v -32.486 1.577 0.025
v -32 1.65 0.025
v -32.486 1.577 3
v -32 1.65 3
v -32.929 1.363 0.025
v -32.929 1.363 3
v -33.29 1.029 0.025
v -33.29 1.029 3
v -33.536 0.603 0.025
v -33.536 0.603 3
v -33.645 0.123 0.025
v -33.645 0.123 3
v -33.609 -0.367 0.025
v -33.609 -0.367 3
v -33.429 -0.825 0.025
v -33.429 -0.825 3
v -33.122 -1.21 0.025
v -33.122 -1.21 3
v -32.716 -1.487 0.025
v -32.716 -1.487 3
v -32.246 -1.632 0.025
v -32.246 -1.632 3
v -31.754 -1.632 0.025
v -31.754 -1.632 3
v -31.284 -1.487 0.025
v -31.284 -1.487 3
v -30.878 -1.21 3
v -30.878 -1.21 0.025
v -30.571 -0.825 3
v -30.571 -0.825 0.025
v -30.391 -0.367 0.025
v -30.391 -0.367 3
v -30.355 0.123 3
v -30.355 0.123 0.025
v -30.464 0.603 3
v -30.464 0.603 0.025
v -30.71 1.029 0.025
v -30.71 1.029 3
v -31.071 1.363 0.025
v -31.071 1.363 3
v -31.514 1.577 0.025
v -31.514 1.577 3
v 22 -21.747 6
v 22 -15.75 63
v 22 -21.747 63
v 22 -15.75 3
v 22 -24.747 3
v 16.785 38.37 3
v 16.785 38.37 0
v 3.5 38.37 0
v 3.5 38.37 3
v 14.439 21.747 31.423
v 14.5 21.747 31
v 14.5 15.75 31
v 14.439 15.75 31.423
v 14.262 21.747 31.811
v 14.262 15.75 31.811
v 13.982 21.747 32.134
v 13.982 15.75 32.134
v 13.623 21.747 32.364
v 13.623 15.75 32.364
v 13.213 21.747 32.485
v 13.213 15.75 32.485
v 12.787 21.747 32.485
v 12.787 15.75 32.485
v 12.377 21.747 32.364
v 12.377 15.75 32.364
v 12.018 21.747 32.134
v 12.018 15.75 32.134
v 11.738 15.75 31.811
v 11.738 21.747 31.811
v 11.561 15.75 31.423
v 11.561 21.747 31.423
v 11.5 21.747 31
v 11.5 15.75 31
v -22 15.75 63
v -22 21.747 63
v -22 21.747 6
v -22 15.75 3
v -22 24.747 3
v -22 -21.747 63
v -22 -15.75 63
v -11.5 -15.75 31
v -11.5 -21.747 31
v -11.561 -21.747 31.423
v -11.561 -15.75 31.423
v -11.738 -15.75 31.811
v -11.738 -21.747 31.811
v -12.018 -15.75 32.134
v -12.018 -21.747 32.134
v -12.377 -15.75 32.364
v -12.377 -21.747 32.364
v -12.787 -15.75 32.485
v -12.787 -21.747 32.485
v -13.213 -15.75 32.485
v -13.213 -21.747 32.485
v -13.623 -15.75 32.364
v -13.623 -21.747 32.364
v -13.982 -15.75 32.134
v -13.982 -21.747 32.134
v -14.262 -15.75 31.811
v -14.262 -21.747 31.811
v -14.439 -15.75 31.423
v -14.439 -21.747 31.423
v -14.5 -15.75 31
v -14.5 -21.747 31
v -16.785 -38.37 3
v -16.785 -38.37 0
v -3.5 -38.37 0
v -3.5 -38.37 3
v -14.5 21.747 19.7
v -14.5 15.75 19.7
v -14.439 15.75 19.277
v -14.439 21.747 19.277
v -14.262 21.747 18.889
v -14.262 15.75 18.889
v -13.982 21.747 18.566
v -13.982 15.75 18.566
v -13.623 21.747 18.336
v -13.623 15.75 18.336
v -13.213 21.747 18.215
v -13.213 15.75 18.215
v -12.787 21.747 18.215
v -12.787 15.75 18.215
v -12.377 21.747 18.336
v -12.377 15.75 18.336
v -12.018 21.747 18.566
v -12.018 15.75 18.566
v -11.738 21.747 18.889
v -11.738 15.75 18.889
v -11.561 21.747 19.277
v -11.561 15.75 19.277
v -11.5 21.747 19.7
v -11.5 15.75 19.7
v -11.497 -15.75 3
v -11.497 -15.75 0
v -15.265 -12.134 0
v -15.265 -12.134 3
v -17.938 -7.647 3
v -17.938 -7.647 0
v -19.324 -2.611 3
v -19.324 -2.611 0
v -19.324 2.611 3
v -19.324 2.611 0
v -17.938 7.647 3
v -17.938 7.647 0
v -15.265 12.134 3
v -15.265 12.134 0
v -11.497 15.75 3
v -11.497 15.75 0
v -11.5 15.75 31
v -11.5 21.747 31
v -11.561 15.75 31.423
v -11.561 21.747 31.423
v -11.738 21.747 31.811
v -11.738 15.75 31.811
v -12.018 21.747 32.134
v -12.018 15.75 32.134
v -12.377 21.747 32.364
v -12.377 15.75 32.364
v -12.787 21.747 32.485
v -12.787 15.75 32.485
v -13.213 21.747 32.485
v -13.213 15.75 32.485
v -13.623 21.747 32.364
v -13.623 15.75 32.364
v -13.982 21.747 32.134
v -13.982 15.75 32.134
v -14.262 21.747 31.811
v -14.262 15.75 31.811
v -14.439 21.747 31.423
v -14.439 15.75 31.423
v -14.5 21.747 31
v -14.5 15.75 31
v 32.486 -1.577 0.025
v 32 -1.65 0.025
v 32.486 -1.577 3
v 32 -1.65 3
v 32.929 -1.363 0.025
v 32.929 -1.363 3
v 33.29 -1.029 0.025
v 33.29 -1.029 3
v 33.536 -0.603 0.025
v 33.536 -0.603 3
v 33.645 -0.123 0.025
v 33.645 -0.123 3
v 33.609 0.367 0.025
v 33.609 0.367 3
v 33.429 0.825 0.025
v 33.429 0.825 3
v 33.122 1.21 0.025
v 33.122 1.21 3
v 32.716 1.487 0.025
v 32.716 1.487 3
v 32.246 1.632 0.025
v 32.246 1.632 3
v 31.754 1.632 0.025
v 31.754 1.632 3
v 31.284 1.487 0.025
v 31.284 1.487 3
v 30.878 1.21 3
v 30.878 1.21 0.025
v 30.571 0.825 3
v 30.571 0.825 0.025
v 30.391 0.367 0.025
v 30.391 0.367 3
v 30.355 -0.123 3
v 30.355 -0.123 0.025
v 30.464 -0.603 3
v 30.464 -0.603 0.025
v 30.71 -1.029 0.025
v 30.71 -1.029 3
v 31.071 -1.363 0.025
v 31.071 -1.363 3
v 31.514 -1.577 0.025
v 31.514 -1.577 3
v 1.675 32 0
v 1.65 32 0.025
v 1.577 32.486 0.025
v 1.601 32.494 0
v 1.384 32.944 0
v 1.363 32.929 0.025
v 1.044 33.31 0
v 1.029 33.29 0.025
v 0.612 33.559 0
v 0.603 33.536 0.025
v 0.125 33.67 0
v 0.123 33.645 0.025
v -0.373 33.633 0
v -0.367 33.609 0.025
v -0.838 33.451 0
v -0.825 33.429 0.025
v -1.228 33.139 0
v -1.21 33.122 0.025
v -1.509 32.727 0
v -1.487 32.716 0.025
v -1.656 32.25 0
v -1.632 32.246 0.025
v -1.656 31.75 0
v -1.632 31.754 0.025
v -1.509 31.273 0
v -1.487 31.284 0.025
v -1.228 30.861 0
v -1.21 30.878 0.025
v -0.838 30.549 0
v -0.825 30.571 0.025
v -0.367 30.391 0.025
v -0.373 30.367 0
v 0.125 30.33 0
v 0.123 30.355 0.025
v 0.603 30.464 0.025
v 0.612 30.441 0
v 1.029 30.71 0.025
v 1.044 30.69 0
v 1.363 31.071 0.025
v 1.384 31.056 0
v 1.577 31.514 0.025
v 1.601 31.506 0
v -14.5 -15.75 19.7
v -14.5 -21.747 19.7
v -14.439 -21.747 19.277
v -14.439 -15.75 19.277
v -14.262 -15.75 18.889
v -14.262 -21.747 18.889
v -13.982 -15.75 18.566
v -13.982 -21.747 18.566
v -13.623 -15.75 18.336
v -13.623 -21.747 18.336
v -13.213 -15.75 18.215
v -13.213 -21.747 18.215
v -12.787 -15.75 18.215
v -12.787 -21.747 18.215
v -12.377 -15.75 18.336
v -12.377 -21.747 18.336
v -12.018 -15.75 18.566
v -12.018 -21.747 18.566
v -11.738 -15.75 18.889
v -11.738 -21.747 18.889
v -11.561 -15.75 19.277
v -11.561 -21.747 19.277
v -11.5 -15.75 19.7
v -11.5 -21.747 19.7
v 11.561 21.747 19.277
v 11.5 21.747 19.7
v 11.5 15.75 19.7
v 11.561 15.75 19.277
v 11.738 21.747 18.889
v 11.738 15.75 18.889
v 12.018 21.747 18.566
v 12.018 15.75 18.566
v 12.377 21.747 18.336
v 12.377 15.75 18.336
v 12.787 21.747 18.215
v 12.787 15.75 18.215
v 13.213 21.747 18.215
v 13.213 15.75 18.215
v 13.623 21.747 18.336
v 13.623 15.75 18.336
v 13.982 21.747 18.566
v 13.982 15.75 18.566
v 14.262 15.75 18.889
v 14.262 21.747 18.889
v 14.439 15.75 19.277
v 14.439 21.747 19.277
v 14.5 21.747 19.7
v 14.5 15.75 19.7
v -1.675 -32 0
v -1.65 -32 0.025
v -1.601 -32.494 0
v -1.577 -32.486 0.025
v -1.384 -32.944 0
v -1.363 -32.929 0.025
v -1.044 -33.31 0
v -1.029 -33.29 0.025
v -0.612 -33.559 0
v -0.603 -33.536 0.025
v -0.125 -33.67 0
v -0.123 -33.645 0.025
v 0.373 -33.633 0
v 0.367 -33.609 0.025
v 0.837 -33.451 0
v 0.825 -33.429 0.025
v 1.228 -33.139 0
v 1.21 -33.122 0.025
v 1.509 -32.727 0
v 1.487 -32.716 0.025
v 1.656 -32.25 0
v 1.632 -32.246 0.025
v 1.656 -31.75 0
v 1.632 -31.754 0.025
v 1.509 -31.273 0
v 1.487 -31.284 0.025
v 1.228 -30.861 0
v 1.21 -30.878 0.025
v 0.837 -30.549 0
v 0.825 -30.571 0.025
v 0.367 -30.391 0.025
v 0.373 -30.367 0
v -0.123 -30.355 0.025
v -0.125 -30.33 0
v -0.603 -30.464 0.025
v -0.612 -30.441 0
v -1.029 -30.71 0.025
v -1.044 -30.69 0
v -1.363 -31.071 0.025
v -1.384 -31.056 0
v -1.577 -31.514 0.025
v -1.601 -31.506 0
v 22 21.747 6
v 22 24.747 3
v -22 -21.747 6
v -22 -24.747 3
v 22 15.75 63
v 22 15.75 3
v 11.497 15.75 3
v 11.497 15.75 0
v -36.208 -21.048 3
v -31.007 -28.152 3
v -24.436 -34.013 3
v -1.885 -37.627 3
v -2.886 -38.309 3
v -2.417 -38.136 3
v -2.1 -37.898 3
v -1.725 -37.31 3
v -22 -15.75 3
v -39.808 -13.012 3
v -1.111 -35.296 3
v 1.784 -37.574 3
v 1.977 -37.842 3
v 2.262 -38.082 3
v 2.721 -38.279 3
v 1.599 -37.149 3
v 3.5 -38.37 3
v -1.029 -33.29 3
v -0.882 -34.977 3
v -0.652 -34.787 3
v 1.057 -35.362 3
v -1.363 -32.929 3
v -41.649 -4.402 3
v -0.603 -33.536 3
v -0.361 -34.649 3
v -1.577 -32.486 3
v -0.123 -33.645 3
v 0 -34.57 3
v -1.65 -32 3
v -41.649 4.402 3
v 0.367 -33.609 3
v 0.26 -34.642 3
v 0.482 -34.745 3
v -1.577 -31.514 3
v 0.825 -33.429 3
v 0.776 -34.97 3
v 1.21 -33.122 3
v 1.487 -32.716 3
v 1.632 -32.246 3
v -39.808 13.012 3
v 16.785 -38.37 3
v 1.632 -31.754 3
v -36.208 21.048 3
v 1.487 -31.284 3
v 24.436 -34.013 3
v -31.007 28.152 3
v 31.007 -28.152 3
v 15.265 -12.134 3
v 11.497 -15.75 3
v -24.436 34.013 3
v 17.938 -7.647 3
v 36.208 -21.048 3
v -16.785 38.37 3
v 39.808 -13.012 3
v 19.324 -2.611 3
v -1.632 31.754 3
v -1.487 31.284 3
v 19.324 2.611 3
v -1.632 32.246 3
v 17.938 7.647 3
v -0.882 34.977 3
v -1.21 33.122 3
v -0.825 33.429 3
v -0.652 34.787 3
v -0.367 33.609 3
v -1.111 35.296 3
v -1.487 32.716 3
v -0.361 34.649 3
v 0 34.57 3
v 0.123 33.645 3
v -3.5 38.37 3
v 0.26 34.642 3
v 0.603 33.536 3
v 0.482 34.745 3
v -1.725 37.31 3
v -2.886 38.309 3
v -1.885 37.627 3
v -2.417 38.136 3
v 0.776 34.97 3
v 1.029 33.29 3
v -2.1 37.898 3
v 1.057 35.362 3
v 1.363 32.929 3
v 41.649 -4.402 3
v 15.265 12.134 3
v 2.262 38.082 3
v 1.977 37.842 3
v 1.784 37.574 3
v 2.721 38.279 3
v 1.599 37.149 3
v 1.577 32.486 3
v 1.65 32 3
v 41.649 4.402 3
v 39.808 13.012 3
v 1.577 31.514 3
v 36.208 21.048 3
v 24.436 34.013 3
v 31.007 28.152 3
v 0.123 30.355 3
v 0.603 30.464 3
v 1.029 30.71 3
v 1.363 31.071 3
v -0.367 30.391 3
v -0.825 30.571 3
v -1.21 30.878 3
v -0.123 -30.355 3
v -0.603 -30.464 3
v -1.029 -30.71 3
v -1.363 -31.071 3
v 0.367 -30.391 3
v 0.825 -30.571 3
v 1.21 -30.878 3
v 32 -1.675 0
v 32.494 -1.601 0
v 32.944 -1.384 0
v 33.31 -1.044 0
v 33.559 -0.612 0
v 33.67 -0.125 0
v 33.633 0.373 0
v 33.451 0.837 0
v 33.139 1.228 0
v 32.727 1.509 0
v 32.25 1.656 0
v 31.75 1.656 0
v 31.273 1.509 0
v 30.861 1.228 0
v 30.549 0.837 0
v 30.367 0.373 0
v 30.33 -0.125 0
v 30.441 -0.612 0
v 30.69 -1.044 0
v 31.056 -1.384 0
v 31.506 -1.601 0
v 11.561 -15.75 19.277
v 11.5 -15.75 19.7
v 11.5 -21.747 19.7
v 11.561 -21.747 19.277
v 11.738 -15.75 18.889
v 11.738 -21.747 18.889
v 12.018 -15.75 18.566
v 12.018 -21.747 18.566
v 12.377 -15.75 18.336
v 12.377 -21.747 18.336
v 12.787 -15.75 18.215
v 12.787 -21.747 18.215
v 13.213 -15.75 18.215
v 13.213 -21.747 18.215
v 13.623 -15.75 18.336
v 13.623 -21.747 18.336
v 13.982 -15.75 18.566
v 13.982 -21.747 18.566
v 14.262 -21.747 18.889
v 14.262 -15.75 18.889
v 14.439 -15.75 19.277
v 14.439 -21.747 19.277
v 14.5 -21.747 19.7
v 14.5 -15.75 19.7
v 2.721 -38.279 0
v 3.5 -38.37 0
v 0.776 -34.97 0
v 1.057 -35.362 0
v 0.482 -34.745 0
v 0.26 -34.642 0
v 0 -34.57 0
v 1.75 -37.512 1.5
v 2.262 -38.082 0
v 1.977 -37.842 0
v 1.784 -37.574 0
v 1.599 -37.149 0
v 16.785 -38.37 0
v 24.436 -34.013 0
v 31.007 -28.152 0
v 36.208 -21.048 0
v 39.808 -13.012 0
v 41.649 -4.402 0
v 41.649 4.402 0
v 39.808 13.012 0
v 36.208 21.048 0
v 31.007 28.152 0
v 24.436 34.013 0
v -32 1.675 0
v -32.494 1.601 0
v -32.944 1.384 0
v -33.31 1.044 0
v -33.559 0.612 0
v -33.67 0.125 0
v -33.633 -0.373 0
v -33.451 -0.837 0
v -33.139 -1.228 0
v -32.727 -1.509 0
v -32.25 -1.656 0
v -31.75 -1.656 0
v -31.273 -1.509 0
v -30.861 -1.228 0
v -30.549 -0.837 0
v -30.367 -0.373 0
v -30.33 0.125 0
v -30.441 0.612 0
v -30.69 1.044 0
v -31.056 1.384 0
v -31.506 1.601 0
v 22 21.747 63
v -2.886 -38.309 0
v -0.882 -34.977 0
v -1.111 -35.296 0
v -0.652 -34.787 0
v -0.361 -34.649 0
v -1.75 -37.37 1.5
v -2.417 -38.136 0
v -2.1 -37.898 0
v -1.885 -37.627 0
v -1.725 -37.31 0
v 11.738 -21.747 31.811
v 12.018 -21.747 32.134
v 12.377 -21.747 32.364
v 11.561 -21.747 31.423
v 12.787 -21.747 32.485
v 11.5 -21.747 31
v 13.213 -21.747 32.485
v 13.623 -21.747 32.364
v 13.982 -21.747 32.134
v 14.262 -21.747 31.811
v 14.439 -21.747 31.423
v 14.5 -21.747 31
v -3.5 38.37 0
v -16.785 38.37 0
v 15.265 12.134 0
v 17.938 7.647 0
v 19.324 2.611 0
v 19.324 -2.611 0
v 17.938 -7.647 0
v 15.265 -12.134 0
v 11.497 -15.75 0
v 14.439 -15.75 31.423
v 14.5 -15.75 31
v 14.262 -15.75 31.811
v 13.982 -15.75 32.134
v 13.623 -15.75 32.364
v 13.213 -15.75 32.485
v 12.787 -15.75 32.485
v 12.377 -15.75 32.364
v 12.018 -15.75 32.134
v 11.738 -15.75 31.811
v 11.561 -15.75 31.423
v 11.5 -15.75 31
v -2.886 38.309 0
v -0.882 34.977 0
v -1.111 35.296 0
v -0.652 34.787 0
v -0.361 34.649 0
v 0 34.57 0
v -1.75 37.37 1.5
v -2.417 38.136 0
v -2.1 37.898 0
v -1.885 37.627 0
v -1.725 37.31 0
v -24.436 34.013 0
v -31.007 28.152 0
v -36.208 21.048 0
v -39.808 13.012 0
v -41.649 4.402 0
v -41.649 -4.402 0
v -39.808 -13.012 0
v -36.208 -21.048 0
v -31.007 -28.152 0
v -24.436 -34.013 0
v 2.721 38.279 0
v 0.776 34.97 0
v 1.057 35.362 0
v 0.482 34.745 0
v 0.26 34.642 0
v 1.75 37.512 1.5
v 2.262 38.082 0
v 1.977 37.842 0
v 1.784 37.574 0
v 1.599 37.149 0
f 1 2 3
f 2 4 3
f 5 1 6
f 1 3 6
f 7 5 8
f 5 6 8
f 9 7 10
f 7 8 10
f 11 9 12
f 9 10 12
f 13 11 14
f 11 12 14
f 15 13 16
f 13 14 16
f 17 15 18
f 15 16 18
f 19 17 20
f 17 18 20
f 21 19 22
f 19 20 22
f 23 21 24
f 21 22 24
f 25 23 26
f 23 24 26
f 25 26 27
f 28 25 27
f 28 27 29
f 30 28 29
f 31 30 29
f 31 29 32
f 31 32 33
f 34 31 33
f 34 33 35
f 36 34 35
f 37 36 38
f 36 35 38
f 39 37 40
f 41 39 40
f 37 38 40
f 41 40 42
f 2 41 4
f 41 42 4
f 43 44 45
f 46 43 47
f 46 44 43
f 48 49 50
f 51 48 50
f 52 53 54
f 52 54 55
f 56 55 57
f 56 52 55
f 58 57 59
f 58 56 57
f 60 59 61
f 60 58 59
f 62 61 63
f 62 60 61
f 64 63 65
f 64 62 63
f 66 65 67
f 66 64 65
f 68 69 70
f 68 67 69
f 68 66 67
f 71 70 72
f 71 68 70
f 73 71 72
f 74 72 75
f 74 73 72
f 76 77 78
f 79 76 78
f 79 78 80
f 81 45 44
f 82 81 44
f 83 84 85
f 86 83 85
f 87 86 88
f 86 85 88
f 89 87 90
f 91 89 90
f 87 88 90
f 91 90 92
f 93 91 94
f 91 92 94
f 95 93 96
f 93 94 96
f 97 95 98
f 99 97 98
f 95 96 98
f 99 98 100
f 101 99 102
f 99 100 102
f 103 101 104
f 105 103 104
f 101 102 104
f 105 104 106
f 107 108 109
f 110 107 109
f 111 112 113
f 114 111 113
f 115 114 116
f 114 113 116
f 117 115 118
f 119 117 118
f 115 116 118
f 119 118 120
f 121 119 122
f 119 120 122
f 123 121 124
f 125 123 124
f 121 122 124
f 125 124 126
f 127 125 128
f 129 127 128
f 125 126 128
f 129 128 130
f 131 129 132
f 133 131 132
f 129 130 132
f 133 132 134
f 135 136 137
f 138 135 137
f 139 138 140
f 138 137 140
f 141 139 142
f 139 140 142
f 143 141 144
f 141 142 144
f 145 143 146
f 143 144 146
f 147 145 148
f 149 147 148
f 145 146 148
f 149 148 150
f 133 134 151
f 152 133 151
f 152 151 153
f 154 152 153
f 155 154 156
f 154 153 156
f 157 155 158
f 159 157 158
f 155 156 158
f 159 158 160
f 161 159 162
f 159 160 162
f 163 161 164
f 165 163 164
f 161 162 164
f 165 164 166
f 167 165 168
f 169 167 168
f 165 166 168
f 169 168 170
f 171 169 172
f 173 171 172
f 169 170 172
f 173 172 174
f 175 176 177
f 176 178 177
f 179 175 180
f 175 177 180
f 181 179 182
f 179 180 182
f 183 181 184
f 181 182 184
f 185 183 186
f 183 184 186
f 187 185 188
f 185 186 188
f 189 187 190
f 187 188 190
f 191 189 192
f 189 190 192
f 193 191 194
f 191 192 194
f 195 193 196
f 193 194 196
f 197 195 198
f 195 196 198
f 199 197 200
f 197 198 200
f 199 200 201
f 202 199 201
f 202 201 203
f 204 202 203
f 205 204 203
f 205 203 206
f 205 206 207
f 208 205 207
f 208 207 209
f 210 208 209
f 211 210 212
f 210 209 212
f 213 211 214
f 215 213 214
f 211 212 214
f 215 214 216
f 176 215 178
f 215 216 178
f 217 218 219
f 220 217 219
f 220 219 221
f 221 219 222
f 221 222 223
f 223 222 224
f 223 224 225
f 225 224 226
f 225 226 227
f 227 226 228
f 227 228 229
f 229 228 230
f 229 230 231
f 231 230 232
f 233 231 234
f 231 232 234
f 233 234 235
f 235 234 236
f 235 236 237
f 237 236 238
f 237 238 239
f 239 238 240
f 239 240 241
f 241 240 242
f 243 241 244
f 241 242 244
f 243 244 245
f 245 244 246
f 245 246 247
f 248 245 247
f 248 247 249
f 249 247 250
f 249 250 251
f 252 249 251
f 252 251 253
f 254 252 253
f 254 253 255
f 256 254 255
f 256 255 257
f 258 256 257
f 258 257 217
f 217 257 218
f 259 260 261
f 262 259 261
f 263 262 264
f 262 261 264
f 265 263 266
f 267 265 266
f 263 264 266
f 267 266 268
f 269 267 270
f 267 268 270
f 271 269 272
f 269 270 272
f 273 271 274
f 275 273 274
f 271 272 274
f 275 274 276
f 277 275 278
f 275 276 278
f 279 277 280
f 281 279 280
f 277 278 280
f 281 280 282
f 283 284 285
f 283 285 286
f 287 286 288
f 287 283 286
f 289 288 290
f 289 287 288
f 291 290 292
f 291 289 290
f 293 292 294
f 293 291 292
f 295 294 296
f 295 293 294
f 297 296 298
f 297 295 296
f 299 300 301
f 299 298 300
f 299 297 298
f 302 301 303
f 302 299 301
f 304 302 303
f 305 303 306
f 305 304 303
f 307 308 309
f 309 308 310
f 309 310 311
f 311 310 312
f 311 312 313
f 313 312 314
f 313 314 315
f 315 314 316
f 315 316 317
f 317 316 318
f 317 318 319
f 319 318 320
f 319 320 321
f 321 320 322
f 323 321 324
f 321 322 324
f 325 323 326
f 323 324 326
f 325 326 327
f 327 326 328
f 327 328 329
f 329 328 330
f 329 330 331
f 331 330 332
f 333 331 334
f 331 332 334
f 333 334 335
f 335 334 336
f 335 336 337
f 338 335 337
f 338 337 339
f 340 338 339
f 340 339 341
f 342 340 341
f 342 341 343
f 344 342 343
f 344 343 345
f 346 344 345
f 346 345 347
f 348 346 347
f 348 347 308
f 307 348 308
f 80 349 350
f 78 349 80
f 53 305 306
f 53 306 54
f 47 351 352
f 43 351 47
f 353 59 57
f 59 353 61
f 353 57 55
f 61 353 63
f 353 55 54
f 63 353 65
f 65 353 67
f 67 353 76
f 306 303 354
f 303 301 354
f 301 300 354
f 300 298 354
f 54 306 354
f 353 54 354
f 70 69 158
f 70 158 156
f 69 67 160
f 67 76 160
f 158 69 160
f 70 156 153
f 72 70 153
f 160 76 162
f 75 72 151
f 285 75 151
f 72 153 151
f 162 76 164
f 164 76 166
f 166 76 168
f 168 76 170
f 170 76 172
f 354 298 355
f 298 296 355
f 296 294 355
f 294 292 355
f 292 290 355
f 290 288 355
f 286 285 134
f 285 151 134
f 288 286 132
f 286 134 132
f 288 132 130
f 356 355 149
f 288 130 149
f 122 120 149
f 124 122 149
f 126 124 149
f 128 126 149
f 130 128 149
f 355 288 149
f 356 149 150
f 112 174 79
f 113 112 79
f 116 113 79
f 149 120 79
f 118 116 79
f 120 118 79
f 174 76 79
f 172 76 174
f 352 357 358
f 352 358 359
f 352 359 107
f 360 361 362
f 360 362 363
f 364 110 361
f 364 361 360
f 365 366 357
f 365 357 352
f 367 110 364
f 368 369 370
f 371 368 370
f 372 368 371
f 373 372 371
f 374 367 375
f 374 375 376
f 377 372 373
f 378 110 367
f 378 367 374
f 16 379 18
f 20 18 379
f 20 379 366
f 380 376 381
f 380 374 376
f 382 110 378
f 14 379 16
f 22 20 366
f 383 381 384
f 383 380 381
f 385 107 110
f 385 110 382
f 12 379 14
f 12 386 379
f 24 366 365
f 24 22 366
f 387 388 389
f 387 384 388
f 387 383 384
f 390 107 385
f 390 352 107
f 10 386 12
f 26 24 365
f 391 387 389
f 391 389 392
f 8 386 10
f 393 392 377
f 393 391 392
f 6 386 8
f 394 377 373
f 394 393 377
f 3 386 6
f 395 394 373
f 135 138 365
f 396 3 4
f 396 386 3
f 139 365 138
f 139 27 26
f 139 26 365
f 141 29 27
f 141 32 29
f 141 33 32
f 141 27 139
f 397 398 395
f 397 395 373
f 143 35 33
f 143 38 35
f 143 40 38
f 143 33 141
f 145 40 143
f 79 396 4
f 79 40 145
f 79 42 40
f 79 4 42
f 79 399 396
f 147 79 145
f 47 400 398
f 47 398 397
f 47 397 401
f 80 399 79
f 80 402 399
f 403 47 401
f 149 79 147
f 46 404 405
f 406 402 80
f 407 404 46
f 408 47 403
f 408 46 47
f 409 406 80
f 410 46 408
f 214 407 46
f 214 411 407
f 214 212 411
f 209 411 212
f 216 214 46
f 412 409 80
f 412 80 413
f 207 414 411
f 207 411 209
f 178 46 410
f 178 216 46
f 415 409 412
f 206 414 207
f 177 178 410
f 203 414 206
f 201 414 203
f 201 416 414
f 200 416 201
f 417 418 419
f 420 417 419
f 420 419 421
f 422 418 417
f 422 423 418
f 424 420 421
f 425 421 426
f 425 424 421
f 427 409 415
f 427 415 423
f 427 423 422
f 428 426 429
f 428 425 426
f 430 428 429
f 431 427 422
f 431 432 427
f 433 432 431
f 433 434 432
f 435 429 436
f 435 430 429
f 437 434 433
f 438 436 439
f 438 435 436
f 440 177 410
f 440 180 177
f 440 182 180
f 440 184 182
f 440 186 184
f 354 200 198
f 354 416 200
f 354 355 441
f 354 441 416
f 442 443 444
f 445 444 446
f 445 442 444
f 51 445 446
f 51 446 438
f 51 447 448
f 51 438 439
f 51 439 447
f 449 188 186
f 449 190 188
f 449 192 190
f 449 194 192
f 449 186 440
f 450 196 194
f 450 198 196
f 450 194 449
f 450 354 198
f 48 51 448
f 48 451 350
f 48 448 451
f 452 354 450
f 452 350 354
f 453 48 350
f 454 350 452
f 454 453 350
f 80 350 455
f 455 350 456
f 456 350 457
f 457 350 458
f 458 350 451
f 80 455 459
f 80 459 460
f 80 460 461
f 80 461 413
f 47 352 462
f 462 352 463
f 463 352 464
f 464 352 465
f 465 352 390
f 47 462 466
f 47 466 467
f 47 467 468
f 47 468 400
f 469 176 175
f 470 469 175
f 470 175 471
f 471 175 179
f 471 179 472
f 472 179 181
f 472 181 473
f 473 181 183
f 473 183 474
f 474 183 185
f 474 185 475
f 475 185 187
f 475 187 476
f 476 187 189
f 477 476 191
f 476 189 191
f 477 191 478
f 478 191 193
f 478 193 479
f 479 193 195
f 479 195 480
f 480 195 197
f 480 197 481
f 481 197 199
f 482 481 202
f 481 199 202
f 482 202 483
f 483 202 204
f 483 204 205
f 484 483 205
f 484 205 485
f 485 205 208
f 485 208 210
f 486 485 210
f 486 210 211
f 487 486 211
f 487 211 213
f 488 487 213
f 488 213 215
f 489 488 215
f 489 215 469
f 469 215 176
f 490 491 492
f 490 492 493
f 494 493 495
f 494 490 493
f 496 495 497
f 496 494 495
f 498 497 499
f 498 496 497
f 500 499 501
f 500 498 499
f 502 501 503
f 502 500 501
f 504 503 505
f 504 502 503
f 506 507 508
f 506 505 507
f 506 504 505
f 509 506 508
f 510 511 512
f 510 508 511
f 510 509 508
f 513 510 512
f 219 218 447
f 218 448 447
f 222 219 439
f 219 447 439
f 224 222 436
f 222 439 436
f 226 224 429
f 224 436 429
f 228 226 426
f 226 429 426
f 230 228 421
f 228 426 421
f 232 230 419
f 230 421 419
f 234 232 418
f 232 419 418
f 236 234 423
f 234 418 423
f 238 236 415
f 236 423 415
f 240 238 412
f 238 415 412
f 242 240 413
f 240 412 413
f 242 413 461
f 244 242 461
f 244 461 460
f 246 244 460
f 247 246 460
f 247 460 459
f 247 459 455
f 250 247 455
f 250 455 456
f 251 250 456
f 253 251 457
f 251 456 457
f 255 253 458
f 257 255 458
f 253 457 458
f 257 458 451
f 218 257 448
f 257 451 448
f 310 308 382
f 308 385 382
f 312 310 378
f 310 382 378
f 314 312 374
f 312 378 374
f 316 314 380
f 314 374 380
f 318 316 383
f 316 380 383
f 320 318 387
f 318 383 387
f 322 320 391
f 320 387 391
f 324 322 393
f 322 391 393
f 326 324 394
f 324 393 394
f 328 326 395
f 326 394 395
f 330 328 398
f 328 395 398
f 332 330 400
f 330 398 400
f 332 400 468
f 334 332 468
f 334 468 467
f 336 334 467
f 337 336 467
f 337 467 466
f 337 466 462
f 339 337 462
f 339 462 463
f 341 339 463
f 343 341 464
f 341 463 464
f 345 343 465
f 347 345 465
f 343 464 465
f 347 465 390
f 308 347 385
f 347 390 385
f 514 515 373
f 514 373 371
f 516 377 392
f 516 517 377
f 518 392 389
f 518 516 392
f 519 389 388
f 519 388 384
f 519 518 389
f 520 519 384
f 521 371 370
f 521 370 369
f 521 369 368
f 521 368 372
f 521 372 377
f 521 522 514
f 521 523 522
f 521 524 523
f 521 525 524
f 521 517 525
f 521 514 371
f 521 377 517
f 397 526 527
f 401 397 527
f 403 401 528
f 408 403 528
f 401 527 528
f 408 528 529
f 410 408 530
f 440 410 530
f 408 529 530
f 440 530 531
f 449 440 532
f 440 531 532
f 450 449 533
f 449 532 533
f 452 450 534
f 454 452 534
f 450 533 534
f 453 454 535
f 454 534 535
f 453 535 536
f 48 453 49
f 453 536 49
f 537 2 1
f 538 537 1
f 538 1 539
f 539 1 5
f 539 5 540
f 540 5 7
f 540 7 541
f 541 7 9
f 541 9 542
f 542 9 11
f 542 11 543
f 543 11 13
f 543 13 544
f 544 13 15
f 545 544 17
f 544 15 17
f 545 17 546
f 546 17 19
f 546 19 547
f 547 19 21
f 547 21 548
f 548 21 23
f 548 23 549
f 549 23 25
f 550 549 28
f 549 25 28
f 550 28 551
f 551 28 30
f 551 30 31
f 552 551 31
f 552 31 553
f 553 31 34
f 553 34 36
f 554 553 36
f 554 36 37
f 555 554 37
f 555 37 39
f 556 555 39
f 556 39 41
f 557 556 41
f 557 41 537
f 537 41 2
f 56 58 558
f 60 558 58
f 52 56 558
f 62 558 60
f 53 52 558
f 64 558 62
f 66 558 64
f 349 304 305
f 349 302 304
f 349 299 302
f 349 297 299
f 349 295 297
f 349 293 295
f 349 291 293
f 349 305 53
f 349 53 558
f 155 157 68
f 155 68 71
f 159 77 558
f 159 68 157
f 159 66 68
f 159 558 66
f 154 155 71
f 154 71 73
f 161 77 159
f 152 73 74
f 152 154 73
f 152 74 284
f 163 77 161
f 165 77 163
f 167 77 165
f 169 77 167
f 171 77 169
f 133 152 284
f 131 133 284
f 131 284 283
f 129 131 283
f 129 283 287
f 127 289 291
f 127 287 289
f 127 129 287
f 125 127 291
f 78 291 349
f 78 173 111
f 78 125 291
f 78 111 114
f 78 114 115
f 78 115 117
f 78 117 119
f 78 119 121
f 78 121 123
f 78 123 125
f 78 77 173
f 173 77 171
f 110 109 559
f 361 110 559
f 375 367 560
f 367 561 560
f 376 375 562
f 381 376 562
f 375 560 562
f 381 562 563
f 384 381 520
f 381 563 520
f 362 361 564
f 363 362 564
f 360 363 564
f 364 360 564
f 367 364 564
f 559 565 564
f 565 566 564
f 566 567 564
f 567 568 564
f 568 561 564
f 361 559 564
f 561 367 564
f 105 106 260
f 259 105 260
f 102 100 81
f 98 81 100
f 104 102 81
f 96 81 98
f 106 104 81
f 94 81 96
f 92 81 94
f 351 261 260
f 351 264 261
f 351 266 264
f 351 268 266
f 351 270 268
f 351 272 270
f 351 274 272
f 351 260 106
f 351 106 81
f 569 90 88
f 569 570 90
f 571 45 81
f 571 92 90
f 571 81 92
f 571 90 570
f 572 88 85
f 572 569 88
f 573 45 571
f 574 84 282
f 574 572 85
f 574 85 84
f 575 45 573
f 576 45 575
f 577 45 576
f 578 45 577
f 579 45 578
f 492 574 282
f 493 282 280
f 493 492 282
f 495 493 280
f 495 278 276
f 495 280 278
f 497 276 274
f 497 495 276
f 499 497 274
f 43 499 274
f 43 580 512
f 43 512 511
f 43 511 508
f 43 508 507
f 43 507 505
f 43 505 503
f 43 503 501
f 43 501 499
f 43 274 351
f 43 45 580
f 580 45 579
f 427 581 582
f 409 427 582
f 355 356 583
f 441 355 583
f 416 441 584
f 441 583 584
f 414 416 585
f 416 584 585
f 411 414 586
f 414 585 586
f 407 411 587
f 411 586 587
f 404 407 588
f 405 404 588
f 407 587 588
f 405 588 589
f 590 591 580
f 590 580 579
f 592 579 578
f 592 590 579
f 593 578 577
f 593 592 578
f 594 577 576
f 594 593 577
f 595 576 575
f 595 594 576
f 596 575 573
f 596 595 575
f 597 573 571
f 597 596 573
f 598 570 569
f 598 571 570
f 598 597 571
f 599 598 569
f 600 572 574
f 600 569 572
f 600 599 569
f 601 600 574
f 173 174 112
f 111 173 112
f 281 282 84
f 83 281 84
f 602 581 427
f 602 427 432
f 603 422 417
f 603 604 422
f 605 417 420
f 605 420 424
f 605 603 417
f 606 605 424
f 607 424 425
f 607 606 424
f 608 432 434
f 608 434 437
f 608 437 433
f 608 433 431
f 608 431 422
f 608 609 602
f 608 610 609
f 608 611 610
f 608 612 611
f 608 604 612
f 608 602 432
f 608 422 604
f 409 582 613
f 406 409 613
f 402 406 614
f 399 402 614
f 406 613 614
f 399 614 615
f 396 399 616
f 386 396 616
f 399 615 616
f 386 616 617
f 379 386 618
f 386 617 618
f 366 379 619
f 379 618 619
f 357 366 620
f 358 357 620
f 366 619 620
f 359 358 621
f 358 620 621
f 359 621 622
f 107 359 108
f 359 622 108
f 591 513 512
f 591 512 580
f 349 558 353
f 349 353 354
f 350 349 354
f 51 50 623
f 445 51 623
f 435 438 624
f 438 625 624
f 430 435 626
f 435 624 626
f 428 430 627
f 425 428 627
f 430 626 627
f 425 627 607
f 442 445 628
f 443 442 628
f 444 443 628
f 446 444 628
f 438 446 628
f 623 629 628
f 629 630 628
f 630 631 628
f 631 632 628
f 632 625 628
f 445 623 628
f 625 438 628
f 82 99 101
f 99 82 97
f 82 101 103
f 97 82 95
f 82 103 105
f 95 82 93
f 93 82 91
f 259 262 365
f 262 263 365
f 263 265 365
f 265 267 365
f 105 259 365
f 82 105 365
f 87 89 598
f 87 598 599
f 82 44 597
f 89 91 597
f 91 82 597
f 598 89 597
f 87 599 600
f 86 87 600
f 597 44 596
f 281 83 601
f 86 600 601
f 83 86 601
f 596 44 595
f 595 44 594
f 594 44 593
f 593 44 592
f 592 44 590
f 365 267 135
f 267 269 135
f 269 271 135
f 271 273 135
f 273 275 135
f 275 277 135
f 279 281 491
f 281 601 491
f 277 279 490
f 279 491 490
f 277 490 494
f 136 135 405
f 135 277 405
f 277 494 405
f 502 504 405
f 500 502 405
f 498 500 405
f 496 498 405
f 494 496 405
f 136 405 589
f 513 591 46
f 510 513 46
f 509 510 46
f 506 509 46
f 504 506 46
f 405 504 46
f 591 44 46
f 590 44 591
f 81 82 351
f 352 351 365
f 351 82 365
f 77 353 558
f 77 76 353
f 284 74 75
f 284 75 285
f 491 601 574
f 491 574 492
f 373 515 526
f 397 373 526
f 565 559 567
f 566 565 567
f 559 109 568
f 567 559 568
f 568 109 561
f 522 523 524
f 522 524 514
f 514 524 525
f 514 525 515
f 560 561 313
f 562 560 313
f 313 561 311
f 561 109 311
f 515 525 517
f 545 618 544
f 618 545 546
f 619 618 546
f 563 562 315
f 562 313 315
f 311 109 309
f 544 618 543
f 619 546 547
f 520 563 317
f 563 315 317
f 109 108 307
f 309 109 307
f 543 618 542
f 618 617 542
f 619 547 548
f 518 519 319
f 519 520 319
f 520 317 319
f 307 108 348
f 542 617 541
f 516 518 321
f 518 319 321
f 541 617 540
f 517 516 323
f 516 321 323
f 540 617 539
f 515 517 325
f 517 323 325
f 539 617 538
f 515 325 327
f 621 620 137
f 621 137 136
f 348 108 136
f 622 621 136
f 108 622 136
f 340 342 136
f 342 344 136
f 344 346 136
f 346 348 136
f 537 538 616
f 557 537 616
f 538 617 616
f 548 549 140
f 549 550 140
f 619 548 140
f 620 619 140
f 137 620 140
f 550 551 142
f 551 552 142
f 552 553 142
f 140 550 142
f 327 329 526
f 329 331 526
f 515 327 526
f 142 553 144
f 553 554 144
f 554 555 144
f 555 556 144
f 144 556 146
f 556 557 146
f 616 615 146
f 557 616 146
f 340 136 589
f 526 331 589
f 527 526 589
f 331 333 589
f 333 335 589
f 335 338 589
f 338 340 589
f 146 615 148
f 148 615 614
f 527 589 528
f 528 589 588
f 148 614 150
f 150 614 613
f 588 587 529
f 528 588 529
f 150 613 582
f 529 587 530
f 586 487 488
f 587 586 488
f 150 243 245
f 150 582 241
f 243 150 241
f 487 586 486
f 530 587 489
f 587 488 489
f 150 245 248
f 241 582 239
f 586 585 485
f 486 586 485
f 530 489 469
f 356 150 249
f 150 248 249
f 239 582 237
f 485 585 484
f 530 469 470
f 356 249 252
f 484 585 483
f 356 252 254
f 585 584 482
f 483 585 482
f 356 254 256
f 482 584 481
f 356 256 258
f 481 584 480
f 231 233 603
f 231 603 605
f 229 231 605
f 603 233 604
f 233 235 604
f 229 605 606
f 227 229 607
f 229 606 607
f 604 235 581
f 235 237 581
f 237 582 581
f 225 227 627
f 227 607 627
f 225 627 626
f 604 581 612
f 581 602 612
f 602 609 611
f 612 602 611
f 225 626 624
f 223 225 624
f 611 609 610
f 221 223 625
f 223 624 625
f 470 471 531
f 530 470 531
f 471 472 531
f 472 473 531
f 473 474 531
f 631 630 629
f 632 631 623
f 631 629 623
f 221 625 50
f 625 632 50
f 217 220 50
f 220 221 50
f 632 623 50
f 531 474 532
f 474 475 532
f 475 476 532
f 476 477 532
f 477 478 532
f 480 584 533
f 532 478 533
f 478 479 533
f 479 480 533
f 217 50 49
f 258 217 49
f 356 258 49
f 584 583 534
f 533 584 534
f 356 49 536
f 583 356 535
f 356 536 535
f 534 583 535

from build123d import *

# Parameters (mm, degrees)
BOSS_EXTRUDE1_DEPTH                   = 3
TAP_DRILL_FOR_M4X0_7_TAP1_D           = 3.3
TAP_DRILL_FOR_M4X0_7_TAP1_CSINK_D     = 3.35
TAP_DRILL_FOR_M4X0_7_TAP1_CSINK_ANGLE = 90
CIRPATTERN1_COUNT                     = 4
SKETCH11_W                            = 60
SKETCH11_H                            = 5.997041234
BOSS_EXTRUDE2_DEPTH                   = 22
CUT_EXTRUDE4_DEPTH                    = 35
CHAMFER1_SIZE                         = 3
CHAMFER2_SIZE                         = 3


with BuildPart() as part:
    # Sketch1 → Boss-Extrude1 (new body)
    with BuildSketch(Plane.XY):
        with BuildLine():
            Line((-16.785410333, -38.37), (-3.5, -38.37))
            add(Edge.make_bspline(
                [(-3.5, -38.37), (-2.487663845, -38.37), (-1.180873463, -37.25254604), (-1.493022396, -34.741636396), (0, -34.57)],
                knots=[0, 0, 0, 0, 0.364574194, 1, 1, 1, 1], degree=3))
            add(Edge.make_bspline(
                [(3.5, -38.37), (2.522461063, -38.37), (1.117320535, -37.441425493), (1.462124558, -34.862224896), (0, -34.57)],
                knots=[0, 0, 0, 0, 0.352042618, 1, 1, 1, 1], degree=3))
            Line((3.5, -38.37), (16.785410333, -38.37))
            ThreePointArc((16.785410333, -38.37), (41.88086556, 0), (16.785410333, 38.37))
            Line((16.785410333, 38.37), (3.5, 38.37))
            add(Edge.make_bspline(
                [(3.5, 38.37), (2.522461063, 38.37), (1.117320535, 37.441425493), (1.462124558, 34.862224896), (0, 34.57)],
                knots=[0, 0, 0, 0, 0.352042618, 1, 1, 1, 1], degree=3))
            add(Edge.make_bspline(
                [(-3.5, 38.37), (-2.487663845, 38.37), (-1.180873463, 37.25254604), (-1.493022396, 34.741636396), (0, 34.57)],
                knots=[0, 0, 0, 0, 0.364574194, 1, 1, 1, 1], degree=3))
            Line((-3.5, 38.37), (-16.785410333, 38.37))
            ThreePointArc((-16.785410333, 38.37), (-41.88086556, 0), (-16.785410333, -38.37))
        make_face()
        with BuildLine():
            Line((11.497282288, -15.75), (-11.497282288, -15.75))
            ThreePointArc((-11.497282288, -15.75), (-19.5, 0), (-11.497282288, 15.75))
            Line((-11.497282288, 15.75), (11.497282288, 15.75))
            ThreePointArc((11.497282288, 15.75), (19.5, 0), (11.497282288, -15.75))
        make_face(mode=Mode.SUBTRACT)
    extrude(amount=BOSS_EXTRUDE1_DEPTH)

    # Tap Drill for M4x0.7 Tap1 (through all)
    with Locations(Plane(origin=(0, 32, 0), x_dir=(-1, 0, 0), z_dir=(0, 0, -1))):
        with Locations((0, 0)):
            tap_drill_for_m4x0_7_tap1 = CounterSinkHole(TAP_DRILL_FOR_M4X0_7_TAP1_D / 2, TAP_DRILL_FOR_M4X0_7_TAP1_CSINK_D / 2, counter_sink_angle=TAP_DRILL_FOR_M4X0_7_TAP1_CSINK_ANGLE)

    # CirPattern1: Tap Drill for M4x0.7 Tap1 ×4 about axis
    cirpattern1_axis = Axis((0, 0, 0), (0, 0, 1))
    for i in range(1, CIRPATTERN1_COUNT):
        add(tap_drill_for_m4x0_7_tap1.rotate(cirpattern1_axis, i * 360 / CIRPATTERN1_COUNT), mode=Mode.SUBTRACT)

    # Sketch11 → Boss-Extrude2 (add, symmetric)
    with BuildSketch(Plane(origin=(0, 0, 0), x_dir=(0, 0, -1), z_dir=(1, 0, 0))):
        with Locations((-33, 18.748520617)):
            Rectangle(SKETCH11_W, SKETCH11_H)
        with Locations((-33, -18.748520617)):
            Rectangle(SKETCH11_W, SKETCH11_H)
    extrude(amount=BOSS_EXTRUDE2_DEPTH, both=True)

    # Sketch9 → Cut-Extrude4 (cut, symmetric)
    with BuildSketch(Plane(origin=(28, 0, 0), x_dir=(0, 0, -1), z_dir=(0, -1, 0))):
        with BuildLine():
            Line((-19.7, -13.5), (-31, -13.5))
            ThreePointArc((-31, -13.5), (-32.5, -15), (-31, -16.5))
            Line((-31, -16.5), (-19.7, -16.5))
            ThreePointArc((-19.7, -16.5), (-18.2, -15), (-19.7, -13.5))
        make_face()
        with BuildLine():
            Line((-19.7, -39.5), (-31, -39.5))
            ThreePointArc((-31, -39.5), (-32.5, -41), (-31, -42.5))
            Line((-31, -42.5), (-19.7, -42.5))
            ThreePointArc((-19.7, -42.5), (-18.2, -41), (-19.7, -39.5))
        make_face()
    extrude(amount=CUT_EXTRUDE4_DEPTH, both=True, mode=Mode.SUBTRACT)

    # Chamfer1
    chamfer1_edges = [part.edges().sort_by_distance(p)[0] for p in [
        (0, 21.747041234, 3),
    ]]
    chamfer(chamfer1_edges, length=CHAMFER1_SIZE)

    # Chamfer2
    chamfer2_edges = [part.edges().sort_by_distance(p)[0] for p in [
        (0, -21.747041234, 3),
    ]]
    chamfer(chamfer2_edges, length=CHAMFER2_SIZE)


solid = part.part
